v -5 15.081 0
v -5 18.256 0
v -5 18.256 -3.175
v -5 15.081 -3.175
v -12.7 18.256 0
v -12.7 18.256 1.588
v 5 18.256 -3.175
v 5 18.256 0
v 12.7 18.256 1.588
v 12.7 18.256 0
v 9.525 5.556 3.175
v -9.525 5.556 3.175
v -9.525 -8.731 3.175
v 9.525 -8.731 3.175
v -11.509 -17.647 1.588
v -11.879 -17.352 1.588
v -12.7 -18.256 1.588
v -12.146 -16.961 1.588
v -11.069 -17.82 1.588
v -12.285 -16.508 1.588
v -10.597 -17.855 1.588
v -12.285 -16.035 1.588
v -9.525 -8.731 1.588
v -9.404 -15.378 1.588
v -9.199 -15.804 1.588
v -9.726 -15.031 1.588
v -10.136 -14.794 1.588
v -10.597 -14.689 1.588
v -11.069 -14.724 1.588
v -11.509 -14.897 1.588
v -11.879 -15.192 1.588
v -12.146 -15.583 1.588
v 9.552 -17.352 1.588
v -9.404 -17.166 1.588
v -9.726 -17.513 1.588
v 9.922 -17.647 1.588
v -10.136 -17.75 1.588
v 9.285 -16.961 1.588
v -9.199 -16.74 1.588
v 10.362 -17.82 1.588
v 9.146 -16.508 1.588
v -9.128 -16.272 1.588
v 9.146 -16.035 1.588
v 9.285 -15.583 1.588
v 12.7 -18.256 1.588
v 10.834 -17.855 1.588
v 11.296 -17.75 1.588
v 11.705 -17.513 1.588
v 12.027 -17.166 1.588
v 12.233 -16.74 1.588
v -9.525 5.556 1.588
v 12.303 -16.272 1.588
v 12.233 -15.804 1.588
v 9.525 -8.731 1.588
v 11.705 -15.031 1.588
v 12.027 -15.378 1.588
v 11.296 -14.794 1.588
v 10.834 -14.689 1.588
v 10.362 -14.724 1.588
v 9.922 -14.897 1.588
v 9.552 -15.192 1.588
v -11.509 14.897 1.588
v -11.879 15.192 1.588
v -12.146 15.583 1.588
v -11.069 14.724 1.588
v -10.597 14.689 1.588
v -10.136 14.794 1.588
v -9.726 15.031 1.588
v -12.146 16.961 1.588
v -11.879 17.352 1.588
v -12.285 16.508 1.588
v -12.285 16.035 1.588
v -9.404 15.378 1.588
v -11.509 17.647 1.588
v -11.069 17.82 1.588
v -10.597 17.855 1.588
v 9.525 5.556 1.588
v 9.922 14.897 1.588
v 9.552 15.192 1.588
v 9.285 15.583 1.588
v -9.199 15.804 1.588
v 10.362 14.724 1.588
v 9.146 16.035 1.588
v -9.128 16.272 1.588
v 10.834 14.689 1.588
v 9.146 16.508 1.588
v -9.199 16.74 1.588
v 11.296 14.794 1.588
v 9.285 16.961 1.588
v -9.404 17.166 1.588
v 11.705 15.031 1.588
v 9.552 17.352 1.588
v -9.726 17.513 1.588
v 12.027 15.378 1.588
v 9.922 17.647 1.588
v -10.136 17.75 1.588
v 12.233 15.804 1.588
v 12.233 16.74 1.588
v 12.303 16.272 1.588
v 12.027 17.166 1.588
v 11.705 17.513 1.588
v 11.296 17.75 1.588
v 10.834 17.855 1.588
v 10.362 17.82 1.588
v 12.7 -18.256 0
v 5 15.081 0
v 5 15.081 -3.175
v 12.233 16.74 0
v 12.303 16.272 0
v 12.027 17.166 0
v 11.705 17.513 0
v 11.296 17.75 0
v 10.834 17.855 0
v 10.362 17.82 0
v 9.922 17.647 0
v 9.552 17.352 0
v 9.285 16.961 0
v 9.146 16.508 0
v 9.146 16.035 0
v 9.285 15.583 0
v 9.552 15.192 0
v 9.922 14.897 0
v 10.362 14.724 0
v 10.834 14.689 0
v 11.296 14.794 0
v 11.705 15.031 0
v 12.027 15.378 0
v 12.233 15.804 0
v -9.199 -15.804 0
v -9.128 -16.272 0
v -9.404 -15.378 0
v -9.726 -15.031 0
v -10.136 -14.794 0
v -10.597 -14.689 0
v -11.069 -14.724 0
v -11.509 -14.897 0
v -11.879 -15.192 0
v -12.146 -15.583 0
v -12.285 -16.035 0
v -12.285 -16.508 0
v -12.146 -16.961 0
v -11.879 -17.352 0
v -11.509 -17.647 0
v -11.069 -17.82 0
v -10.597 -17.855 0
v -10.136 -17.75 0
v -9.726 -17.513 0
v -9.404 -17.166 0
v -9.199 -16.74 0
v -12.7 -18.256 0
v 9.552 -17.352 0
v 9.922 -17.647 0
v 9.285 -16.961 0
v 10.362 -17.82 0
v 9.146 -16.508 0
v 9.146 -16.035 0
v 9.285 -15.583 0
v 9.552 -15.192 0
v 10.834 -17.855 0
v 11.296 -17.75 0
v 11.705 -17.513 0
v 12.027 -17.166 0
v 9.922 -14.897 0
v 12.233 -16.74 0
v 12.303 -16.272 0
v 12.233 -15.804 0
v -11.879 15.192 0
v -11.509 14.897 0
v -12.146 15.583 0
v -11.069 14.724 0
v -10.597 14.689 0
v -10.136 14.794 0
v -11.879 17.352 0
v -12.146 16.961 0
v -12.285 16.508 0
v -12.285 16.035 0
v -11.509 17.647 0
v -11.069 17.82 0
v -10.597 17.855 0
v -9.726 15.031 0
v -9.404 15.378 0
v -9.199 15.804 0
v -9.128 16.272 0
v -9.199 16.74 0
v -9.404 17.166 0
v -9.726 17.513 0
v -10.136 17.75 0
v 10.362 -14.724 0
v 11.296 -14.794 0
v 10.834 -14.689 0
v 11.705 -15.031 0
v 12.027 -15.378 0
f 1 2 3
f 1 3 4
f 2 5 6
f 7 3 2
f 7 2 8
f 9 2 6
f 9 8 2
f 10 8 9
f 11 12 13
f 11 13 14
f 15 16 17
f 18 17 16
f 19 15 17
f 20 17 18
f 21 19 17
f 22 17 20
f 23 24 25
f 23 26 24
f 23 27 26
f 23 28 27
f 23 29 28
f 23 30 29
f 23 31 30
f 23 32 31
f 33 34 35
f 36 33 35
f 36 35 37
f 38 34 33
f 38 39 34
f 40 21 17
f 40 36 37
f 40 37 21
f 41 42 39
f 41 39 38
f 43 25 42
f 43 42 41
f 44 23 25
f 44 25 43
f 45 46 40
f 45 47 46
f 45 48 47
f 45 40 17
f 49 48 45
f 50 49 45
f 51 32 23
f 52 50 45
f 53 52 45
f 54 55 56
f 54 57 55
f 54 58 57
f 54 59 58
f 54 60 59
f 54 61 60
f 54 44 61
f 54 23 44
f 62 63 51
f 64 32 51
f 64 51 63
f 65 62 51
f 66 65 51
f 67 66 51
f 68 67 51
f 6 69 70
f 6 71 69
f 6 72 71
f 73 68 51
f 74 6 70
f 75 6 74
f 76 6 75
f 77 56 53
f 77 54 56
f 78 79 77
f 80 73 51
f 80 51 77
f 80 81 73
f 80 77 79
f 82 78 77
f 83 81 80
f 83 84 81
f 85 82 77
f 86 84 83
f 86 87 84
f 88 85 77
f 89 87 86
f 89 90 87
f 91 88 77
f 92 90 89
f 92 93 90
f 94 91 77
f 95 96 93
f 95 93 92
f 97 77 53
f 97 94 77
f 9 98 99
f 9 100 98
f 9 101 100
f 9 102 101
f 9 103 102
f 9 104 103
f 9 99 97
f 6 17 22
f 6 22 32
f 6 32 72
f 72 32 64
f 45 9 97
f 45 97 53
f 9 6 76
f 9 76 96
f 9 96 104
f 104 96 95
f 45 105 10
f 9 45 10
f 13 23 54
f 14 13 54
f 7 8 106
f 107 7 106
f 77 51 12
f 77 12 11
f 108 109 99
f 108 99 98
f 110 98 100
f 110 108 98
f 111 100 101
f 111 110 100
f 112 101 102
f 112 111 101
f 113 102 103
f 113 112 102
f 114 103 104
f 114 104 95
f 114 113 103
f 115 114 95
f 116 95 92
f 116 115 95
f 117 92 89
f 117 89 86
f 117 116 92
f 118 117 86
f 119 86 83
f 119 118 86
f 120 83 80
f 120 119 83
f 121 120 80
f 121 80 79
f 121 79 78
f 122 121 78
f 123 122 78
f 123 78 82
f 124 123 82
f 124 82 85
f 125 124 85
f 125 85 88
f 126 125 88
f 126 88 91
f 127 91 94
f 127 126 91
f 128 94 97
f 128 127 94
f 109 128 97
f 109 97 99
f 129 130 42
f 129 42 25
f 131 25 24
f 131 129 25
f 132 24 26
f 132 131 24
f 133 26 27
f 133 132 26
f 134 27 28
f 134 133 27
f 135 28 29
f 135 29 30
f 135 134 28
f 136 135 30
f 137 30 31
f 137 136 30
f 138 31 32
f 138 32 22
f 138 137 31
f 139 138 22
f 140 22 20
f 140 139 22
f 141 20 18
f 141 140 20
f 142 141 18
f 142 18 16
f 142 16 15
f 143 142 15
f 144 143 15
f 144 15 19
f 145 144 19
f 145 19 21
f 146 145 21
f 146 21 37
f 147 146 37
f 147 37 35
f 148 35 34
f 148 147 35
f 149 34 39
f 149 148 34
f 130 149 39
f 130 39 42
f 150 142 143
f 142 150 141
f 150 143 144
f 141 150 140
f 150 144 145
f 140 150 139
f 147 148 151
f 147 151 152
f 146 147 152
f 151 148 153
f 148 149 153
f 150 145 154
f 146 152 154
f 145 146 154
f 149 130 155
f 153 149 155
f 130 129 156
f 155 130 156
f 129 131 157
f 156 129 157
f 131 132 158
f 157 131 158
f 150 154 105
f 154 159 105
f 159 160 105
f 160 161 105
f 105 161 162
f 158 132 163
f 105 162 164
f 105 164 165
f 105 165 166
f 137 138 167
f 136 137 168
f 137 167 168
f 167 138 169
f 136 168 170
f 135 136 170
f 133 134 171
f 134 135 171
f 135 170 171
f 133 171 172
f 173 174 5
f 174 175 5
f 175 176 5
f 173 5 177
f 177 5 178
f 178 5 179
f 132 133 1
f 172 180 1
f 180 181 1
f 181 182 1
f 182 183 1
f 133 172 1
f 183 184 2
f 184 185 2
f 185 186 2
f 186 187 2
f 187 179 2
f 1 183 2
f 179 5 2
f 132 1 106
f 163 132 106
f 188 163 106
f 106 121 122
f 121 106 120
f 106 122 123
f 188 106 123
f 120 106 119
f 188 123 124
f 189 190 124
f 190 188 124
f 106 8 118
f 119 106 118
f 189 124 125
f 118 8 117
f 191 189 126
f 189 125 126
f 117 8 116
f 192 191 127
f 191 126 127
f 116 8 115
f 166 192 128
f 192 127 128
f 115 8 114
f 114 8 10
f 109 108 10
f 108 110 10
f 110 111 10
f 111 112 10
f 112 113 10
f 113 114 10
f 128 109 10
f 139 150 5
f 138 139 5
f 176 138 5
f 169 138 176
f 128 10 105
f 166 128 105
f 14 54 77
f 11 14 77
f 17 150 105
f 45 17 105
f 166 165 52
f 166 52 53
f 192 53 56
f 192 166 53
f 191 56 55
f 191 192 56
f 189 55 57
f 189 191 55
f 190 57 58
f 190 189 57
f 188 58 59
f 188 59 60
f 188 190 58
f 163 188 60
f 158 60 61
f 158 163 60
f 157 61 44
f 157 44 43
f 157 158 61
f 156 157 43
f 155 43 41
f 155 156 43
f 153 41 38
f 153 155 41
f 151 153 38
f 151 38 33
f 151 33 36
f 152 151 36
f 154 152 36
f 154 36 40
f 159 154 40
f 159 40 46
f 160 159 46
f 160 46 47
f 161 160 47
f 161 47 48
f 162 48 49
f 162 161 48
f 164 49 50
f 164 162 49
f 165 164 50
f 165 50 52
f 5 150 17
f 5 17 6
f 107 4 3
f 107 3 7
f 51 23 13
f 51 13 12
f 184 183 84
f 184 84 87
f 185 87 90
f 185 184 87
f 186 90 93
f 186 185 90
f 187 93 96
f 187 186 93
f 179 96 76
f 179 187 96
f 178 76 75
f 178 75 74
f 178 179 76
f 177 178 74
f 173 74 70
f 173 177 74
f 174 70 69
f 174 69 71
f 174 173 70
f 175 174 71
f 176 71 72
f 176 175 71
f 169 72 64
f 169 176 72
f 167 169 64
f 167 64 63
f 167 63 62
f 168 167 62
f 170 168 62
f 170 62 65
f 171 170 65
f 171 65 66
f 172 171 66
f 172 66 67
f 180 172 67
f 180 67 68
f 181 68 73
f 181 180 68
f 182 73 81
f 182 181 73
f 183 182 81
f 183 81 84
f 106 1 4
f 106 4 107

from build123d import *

# Parameters (mm, degrees)
F0_W     = 25.4
F0_H     = 36.5125
F0_R     = 1.5875
F1_DEPTH = 1.5875
F2_W     = 19.05
F2_H     = 14.2875
F3_DEPTH = 1.5875
F4_W     = 10
F4_H     = 3.175
F5_DEPTH = 3.175


with BuildPart() as f1:
    # F0 (on Top) → F1 (new body)
    with BuildSketch(Plane.XY):
        Rectangle(F0_W, F0_H)
        with Locations((-10.715625, -16.271875)):
            Circle(F0_R, mode=Mode.SUBTRACT)
        with Locations((10.715625, -16.271875)):
            Circle(F0_R, mode=Mode.SUBTRACT)
        with Locations((-10.715625, 16.271875)):
            Circle(F0_R, mode=Mode.SUBTRACT)
        with Locations((10.715625, 16.271875)):
            Circle(F0_R, mode=Mode.SUBTRACT)
    extrude(amount=F1_DEPTH)

    # F2 (on face) → F3 (join)
    with BuildSketch(Plane.XY.offset(1.5875)):
        with Locations((0, -1.5875)):
            Rectangle(F2_W, F2_H)
    extrude(amount=F3_DEPTH)

    # F4 (on face) → F5 (join)
    with BuildSketch(Plane(origin=(0, 0, 0), x_dir=(1, 0, 0), z_dir=(0, 0, -1))):
        with Locations((0, -16.66875)):
            Rectangle(F4_W, F4_H)
    extrude(amount=F5_DEPTH)


solid = f1.part
